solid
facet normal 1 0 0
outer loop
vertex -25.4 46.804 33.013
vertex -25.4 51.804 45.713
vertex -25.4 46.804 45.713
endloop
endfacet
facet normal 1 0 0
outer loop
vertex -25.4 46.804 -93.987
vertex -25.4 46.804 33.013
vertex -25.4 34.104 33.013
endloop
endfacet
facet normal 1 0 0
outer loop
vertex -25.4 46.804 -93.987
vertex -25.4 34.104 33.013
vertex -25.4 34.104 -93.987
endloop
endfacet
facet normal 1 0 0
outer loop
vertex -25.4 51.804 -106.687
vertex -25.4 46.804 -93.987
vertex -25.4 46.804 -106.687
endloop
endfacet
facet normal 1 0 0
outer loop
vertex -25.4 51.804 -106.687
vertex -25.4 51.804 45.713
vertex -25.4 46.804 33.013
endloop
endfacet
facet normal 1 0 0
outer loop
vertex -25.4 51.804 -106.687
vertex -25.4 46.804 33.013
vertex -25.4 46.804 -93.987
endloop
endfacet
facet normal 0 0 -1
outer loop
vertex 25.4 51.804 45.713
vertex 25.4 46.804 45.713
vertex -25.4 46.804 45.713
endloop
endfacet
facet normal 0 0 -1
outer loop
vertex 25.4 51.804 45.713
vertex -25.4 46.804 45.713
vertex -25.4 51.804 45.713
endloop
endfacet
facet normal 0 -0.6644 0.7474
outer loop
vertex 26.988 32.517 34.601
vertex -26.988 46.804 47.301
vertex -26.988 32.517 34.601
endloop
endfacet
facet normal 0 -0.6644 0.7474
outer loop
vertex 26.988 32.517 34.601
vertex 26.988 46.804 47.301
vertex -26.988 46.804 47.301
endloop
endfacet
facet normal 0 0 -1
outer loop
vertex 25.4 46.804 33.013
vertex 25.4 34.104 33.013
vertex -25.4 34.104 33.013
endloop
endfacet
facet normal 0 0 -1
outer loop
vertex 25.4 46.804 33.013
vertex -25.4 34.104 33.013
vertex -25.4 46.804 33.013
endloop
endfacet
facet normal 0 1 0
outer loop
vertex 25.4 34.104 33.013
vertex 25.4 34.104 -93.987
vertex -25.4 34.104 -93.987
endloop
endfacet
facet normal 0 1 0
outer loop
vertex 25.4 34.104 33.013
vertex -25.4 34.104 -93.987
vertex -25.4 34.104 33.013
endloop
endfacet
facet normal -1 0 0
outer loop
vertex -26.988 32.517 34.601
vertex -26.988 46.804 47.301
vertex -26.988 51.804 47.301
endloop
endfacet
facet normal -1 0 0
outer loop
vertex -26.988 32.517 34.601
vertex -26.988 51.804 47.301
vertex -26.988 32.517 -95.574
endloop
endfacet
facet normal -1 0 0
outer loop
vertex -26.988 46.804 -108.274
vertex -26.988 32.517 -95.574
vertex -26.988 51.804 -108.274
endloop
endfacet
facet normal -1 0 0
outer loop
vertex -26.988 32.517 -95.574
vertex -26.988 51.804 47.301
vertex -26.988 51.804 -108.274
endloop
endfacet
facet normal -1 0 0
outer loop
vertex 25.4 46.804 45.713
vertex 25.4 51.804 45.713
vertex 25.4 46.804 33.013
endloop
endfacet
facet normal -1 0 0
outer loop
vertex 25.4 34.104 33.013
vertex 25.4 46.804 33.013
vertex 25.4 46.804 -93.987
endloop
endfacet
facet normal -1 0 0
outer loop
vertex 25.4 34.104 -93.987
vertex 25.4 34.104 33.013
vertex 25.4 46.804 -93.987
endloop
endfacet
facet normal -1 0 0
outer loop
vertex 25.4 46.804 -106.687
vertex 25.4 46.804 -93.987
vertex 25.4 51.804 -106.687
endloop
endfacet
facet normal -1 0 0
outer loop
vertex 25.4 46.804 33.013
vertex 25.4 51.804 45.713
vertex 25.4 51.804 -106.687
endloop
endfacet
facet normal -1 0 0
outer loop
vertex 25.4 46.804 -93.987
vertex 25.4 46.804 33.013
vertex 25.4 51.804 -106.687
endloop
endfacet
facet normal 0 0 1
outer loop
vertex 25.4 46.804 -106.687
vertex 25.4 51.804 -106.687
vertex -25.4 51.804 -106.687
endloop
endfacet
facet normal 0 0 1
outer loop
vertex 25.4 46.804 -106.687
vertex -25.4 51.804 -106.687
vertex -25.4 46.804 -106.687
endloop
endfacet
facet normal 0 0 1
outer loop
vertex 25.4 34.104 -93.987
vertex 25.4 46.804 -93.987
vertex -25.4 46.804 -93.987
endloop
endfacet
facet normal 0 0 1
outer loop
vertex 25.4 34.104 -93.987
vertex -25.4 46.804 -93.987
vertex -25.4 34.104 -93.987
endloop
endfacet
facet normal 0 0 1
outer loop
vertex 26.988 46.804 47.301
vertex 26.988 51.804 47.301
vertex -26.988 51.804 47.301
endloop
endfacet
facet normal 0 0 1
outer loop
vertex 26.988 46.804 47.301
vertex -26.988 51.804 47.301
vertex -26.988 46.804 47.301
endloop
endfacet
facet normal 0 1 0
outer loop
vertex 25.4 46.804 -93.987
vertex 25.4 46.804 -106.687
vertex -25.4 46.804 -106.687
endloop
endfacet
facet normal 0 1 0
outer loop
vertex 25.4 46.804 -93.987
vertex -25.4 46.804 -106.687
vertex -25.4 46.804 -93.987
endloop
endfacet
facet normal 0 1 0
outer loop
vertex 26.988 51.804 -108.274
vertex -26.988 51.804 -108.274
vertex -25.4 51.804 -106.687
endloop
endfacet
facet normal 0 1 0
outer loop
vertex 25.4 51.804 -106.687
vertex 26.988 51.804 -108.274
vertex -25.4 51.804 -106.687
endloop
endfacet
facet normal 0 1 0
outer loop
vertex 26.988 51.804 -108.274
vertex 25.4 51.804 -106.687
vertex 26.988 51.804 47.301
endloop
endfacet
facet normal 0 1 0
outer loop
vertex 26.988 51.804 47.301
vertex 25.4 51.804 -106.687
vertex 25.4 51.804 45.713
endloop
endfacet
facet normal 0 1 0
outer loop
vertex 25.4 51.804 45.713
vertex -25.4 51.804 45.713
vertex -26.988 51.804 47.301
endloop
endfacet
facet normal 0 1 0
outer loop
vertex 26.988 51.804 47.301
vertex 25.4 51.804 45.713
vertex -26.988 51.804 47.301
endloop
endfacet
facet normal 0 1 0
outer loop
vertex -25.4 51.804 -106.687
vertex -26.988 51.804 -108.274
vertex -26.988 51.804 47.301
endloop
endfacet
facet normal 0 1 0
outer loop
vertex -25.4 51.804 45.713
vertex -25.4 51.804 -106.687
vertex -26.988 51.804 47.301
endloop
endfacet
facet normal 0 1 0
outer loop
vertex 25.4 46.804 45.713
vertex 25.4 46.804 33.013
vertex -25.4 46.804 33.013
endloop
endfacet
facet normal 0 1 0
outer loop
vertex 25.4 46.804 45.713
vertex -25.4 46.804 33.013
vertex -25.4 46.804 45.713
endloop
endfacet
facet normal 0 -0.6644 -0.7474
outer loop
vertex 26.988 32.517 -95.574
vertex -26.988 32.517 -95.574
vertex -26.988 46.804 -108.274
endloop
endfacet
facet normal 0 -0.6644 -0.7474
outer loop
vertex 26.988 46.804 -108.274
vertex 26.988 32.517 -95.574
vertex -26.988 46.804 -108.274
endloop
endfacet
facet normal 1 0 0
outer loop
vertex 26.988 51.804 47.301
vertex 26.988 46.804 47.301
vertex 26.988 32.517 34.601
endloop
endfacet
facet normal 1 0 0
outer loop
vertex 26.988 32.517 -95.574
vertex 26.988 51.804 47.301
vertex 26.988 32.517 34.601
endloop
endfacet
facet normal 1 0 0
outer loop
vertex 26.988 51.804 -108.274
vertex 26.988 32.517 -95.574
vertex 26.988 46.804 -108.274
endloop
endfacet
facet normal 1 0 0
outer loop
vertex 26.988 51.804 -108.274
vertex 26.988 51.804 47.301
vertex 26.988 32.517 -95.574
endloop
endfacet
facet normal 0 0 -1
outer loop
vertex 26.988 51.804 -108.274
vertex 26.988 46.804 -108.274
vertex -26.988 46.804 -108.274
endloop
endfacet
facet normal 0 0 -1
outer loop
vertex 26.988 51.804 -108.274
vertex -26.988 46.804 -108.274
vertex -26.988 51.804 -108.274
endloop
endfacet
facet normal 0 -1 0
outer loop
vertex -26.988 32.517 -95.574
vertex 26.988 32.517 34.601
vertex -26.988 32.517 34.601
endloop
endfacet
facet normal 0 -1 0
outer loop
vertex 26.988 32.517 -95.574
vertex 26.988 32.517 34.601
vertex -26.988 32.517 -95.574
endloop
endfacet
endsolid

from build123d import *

# Parameters (mm, degrees)
BOSS_EXTRUDE1_DEPTH = 26.9875
BOSS_EXTRUDE2_DEPTH = 1.5875


with BuildPart() as part:
    # Sketch3 → Boss-Extrude1 (new, symmetric)
    with BuildSketch(Plane(origin=(0, 0, 0), x_dir=(0, 0, -1), z_dir=(1, 0, 0))):
        Polygon((95.5744504, 32.516625584), (108.2744504, 46.804125584), (108.2744504, 51.804125584), (106.6869504, 51.804125584), (106.6869504, 46.804125584), (93.9869504, 46.804125584), (93.9869504, 34.104125584), (-33.0130496, 34.104125584), (-33.0130496, 46.804125584), (-45.7130496, 46.804125584), (-45.7130496, 51.804125584), (-47.3005496, 51.804125584), (-47.3005496, 46.804125584), (-34.6005496, 32.516625584), align=None)
    extrude(amount=BOSS_EXTRUDE1_DEPTH, both=True)

    # Sketch4 → Boss-Extrude2 (add)
    with BuildSketch(Plane(origin=(26.9875, 0, 0), x_dir=(0, 0, -1), z_dir=(1, 0, 0))):
        Polygon((-33.0130496, 46.804125584), (-33.0130496, 34.104125584), (93.9869504, 34.104125584), (93.9869504, 46.804125584), (108.2744504, 46.804125584), (108.2744504, 51.804125584), (-47.3005496, 51.804125584), (-47.3005496, 46.804125584), align=None)
    boss_extrude2 = extrude(amount=-BOSS_EXTRUDE2_DEPTH)

    # Mirror1: Boss-Extrude2 across plane
    add(boss_extrude2.mirror(Plane(origin=(0, 0, 0), x_dir=(0, 0, 1), z_dir=(1, 0, 0))))


solid = part.part
